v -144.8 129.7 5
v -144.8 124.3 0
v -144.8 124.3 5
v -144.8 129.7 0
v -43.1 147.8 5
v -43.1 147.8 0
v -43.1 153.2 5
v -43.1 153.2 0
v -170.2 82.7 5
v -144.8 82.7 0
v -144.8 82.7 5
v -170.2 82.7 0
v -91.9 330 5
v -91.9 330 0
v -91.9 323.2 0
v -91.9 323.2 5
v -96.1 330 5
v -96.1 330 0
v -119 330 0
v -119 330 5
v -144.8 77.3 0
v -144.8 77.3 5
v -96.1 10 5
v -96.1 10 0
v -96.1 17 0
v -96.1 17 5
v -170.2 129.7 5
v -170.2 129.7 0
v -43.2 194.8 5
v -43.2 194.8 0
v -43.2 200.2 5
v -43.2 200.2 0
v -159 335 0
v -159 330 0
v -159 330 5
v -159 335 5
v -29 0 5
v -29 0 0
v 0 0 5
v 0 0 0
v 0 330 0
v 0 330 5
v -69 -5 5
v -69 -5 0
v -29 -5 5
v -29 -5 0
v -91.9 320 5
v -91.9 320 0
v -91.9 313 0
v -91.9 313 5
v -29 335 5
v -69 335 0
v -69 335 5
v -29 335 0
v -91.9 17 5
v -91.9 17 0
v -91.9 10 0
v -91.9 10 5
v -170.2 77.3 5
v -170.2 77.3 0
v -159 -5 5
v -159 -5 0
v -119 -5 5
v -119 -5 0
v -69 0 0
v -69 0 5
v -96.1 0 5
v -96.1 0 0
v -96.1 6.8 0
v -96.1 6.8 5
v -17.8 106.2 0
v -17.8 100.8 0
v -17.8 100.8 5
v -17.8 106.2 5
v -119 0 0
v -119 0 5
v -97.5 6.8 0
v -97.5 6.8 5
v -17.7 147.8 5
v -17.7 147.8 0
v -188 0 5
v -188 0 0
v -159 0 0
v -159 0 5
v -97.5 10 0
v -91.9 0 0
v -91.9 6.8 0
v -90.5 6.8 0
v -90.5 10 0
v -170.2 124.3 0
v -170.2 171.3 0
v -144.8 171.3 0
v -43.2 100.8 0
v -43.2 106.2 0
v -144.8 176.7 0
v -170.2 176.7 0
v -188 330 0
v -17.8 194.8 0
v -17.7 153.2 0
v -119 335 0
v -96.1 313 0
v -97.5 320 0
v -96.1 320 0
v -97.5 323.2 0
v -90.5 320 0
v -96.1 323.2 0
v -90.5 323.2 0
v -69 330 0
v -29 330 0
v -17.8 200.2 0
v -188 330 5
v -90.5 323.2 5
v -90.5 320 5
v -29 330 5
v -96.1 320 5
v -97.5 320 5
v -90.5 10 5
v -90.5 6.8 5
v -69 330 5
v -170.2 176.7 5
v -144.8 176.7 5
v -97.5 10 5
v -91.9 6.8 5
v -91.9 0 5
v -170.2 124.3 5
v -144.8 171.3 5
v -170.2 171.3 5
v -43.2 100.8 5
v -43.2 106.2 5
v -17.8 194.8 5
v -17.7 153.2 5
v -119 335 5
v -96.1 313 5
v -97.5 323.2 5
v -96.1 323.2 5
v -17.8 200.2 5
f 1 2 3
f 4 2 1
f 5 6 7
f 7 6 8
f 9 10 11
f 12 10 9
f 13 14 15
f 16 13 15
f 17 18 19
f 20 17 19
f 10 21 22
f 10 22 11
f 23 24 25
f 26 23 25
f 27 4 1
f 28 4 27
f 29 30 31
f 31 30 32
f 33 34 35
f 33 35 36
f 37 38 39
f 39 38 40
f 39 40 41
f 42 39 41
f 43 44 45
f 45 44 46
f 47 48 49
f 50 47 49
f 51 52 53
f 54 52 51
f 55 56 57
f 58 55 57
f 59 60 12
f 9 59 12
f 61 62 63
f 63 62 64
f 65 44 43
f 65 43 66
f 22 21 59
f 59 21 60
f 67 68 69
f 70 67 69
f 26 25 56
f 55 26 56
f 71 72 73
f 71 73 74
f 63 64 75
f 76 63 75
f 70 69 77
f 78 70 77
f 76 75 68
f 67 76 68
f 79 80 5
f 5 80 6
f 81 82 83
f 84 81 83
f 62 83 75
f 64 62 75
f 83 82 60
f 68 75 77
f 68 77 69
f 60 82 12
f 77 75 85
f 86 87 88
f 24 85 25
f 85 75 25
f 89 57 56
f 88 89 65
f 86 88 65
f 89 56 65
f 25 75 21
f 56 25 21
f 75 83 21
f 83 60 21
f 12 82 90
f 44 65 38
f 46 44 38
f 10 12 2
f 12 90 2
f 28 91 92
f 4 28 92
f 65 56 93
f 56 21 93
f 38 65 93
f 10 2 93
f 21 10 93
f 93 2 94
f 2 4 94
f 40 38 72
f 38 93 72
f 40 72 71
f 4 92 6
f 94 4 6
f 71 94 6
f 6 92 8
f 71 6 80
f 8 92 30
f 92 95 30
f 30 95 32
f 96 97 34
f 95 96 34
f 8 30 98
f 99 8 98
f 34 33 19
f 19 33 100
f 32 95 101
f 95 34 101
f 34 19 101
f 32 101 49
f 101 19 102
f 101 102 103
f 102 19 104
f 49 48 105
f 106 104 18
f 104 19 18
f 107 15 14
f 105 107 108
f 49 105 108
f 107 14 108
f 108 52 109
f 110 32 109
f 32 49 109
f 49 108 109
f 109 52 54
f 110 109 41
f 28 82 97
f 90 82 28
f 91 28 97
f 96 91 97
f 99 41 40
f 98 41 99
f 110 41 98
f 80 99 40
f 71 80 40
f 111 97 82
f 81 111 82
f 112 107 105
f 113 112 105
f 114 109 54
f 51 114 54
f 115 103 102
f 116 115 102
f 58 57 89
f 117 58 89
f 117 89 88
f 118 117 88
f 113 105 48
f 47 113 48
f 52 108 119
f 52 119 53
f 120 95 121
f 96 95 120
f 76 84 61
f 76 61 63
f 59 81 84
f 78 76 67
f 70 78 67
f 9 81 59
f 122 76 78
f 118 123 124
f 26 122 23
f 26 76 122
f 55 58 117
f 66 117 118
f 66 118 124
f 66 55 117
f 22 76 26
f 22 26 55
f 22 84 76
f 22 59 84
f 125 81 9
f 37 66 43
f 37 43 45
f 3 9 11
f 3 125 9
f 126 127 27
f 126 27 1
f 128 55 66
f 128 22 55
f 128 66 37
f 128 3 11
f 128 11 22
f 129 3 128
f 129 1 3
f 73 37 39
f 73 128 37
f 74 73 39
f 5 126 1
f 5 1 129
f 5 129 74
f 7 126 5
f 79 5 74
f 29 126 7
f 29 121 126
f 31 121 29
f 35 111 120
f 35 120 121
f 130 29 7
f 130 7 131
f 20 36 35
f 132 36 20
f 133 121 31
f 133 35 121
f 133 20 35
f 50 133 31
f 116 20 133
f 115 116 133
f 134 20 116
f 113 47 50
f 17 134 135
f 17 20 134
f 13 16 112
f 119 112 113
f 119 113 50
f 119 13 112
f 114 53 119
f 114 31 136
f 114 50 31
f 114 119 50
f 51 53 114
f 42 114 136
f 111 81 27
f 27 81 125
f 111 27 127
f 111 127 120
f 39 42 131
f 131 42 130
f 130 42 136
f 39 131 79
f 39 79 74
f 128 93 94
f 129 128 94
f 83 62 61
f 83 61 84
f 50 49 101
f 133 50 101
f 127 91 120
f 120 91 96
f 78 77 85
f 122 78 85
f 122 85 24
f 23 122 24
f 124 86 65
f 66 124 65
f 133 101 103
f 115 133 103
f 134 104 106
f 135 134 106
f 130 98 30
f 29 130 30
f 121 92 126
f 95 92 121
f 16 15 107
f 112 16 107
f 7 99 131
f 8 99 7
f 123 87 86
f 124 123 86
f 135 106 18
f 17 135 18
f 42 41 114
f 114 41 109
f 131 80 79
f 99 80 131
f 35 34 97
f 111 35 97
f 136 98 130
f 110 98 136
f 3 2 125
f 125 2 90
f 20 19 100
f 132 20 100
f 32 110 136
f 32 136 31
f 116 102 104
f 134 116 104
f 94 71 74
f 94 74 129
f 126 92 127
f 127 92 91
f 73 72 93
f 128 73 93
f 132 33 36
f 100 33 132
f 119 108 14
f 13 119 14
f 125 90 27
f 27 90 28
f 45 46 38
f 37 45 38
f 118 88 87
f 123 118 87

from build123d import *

# Parameters (mm, degrees)
SKETCH1_W           = 40
SKETCH1_H           = 5
BOSS_EXTRUDE2_DEPTH = 5
SKETCH2_W           = 25.4
SKETCH2_H           = 5.4
CUT_EXTRUDE1_DEPTH  = 5


with BuildPart() as part:
    # Sketch1 → Boss-Extrude2 (new body)
    with BuildSketch(Plane.XY):
        Polygon((-159, 330), (-188, 330), (-188, 0), (-159, 0), (-119, 0), (-96.1, 0), (-96.1, 6.8), (-97.5, 6.8), (-97.5, 10), (-96.1, 10), (-96.1, 17), (-91.9, 17), (-91.9, 10), (-90.5, 10), (-90.5, 6.8), (-91.9, 6.8), (-91.9, 0), (-69, 0), (-29, 0), (0, 0), (0, 330), (-29, 330), (-69, 330), (-91.9, 330), (-91.9, 323.2), (-90.5, 323.2), (-90.5, 320), (-91.9, 320), (-91.9, 313), (-96.1, 313), (-96.1, 320), (-97.5, 320), (-97.5, 323.2), (-96.1, 323.2), (-96.1, 330), (-119, 330), align=None)
        with Locations((-49, 332.5)):
            Rectangle(SKETCH1_W, SKETCH1_H)
        with Locations((-139, 332.5)):
            Rectangle(SKETCH1_W, SKETCH1_H)
        with Locations((-49, -2.5)):
            Rectangle(SKETCH1_W, SKETCH1_H)
        with Locations((-139, -2.5)):
            Rectangle(SKETCH1_W, SKETCH1_H)
    extrude(amount=BOSS_EXTRUDE2_DEPTH)

    # Sketch2 → Cut-Extrude1 (cut)
    with BuildSketch(Plane(origin=(0, 0, 0), x_dir=(-1, 0, 0), z_dir=(0, 0, -1))):
        with Locations((30.5, 197.500001815)):
            Rectangle(SKETCH2_W, SKETCH2_H)
        with Locations((157.5, 174.000000001)):
            Rectangle(SKETCH2_W, SKETCH2_H)
        with Locations((30.4, 150.500001815)):
            Rectangle(SKETCH2_W, SKETCH2_H)
        with Locations((157.5, 127)):
            Rectangle(SKETCH2_W, SKETCH2_H)
        with Locations((30.5, 103.500001815)):
            Rectangle(SKETCH2_W, SKETCH2_H)
        with Locations((157.5, 80)):
            Rectangle(SKETCH2_W, SKETCH2_H)
    extrude(amount=-CUT_EXTRUDE1_DEPTH, mode=Mode.SUBTRACT)


solid = part.part
